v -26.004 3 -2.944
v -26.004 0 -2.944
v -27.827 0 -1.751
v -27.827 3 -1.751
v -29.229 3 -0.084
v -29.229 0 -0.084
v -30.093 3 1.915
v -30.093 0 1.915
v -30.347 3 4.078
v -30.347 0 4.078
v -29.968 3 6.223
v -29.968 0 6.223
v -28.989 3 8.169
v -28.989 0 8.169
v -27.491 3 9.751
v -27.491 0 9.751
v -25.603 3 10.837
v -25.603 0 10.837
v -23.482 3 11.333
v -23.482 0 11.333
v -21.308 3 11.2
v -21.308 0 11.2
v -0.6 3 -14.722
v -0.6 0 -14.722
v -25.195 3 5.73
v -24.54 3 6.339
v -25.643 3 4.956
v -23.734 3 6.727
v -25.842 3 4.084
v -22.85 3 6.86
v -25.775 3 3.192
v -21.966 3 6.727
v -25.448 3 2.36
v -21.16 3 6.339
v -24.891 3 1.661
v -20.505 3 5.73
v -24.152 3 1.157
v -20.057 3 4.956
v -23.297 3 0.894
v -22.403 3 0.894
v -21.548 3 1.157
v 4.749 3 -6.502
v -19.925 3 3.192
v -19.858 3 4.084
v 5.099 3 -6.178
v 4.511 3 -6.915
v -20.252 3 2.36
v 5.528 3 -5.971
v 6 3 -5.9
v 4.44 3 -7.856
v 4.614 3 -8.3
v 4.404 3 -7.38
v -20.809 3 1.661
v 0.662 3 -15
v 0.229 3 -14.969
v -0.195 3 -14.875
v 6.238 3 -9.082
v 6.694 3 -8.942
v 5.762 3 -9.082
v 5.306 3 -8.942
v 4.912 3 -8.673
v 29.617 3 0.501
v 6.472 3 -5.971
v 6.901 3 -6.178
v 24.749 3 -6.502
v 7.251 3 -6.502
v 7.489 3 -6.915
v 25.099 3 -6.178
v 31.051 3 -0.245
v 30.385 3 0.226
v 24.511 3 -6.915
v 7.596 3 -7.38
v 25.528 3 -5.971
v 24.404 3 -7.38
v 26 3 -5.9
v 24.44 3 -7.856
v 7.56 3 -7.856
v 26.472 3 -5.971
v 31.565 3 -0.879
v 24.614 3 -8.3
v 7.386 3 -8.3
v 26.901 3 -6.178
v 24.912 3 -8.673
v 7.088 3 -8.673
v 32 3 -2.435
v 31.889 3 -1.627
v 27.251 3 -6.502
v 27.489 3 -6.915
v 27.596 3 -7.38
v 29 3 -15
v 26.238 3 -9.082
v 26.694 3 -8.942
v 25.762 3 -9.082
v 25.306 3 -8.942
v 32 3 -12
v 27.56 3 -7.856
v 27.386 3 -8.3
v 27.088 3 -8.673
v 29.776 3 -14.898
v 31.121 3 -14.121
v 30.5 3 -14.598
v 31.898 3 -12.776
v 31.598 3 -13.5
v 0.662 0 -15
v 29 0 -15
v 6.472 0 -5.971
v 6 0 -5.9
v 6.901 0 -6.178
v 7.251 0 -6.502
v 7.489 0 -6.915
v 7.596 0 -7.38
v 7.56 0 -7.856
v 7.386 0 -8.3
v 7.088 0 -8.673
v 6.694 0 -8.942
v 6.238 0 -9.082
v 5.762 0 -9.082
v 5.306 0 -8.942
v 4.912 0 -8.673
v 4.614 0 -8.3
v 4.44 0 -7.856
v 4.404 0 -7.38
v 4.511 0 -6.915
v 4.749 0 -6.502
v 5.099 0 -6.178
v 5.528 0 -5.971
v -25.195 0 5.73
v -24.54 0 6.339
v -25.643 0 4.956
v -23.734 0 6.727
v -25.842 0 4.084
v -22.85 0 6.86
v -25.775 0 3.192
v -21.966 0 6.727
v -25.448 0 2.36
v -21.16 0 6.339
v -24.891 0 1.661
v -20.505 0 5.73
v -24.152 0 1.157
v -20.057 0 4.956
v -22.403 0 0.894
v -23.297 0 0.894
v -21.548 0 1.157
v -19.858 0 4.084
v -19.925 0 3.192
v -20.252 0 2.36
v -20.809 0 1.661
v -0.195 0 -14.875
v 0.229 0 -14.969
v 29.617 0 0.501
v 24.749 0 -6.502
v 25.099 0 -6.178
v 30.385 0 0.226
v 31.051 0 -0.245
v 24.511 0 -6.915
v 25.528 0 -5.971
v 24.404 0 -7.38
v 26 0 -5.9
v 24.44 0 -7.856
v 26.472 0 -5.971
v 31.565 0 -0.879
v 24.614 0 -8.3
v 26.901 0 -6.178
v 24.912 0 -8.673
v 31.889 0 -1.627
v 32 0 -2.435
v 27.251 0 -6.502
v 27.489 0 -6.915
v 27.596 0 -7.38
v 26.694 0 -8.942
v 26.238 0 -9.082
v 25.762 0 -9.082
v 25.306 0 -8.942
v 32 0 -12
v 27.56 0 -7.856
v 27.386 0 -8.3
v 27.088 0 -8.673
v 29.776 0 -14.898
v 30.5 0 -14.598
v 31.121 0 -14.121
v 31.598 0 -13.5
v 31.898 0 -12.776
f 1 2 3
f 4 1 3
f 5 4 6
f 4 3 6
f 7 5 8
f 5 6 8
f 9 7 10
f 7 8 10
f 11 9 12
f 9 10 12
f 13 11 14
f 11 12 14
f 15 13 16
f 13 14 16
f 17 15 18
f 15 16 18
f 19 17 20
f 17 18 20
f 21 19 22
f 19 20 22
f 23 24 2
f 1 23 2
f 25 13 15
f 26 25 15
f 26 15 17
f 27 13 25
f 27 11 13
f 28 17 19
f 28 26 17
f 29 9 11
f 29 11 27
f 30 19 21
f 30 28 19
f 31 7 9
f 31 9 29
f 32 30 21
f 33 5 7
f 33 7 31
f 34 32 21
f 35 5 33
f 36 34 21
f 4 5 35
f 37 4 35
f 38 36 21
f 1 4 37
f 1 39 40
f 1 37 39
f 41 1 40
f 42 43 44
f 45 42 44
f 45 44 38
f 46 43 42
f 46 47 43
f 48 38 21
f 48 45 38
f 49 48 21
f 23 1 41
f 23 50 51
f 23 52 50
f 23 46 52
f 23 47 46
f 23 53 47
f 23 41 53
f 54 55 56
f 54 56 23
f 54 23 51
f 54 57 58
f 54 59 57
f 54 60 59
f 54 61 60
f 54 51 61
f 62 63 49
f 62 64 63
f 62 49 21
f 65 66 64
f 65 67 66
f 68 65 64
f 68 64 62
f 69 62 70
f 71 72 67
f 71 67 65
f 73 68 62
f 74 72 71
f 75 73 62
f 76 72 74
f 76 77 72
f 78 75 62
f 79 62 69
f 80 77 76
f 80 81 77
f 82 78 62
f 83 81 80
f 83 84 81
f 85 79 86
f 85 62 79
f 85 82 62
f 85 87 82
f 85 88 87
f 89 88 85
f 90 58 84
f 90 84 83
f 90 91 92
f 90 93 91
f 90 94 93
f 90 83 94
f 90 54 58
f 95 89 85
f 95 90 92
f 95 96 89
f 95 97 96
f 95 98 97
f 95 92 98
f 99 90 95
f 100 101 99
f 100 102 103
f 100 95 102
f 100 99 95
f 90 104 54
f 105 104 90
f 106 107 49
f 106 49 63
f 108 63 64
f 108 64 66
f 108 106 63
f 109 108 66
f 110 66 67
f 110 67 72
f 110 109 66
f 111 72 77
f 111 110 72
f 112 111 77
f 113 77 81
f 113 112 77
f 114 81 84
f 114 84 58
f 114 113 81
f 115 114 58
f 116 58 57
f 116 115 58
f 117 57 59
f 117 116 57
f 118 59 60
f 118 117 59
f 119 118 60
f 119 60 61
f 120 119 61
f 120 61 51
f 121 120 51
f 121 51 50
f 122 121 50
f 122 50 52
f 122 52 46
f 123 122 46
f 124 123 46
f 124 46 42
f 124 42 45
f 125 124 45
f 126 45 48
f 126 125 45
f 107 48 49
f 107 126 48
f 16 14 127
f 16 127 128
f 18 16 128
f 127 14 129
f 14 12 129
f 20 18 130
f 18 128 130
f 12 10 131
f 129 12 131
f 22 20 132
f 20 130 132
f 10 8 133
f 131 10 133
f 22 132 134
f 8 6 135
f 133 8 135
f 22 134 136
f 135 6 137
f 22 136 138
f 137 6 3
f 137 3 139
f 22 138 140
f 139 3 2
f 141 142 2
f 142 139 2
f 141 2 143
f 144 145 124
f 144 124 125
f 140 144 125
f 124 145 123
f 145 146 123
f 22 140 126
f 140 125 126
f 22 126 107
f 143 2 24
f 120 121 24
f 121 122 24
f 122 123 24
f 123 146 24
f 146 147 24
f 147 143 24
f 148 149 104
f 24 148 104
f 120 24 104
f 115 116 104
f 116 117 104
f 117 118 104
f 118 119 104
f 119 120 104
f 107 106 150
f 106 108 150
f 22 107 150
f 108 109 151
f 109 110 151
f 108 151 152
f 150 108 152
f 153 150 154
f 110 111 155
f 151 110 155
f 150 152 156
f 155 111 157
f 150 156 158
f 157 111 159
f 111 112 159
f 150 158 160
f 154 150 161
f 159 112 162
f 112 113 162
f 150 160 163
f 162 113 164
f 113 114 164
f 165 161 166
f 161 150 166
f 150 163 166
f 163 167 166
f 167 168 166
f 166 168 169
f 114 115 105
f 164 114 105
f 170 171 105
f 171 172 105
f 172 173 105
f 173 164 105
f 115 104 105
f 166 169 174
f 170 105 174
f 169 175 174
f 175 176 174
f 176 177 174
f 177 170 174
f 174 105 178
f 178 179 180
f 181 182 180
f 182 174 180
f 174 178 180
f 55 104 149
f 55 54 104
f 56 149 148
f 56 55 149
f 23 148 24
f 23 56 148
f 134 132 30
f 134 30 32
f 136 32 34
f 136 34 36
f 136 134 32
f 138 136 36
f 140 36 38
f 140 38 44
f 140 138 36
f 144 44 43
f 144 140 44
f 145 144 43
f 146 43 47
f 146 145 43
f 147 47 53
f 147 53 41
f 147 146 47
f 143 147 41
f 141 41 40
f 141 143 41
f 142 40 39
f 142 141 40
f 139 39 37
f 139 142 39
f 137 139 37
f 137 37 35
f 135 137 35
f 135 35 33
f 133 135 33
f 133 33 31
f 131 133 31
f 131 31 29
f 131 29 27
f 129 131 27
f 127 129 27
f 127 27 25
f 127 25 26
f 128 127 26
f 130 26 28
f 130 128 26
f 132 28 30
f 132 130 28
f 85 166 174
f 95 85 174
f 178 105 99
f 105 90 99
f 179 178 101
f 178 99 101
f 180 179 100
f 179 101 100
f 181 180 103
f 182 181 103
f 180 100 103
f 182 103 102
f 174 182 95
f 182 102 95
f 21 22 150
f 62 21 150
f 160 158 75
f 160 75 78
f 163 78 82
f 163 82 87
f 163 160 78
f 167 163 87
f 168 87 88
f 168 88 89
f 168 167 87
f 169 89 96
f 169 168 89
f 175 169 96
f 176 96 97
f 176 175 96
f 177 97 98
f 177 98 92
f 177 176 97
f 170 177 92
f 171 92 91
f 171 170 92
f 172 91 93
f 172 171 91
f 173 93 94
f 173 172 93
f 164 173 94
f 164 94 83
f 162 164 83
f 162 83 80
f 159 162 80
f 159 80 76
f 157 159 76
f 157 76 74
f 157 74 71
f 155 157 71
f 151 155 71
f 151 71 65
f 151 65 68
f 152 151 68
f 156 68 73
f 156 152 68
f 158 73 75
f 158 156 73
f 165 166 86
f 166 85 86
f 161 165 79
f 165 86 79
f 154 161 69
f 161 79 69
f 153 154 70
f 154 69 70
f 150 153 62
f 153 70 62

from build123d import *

# Parameters (mm, degrees)
SKETCH_1_R      = 7.5
SKETCH_1_R_2    = 3
SKETCH_1_W      = 32
SKETCH_1_H      = 15
SKETCH_1_R_3    = 1.6
EXTRUDE_1_DEPTH = 3
FILLET_1_R      = 3


with BuildPart() as part:
    # 草图1 → 凸台-拉伸1 (new body)
    # profile 1 of 3: a face of its own
    with BuildSketch(Plane(origin=(0, 0, 0), x_dir=(1, 0, 0), z_dir=(0, 1, 0))):
        with Locations((-22.85, -3.86)):
            Circle(SKETCH_1_R)
        with Locations(Location((-22.85, -3.86, 0), (0, 0, 270))):
            Circle(SKETCH_1_R_2, mode=Mode.SUBTRACT)
    # profile 2 of 3: a face of its own
    with BuildSketch(Plane(origin=(0, 0, 0), x_dir=(1, 0, 0), z_dir=(0, 1, 0))):
        with BuildLine():
            Line((0, 0), (0, 15))
            Line((0, 15), (-26.004488854, 2.944351554))
            ThreePointArc((-26.004488854, 2.944351554), (-18.813210831, 2.460944012), (-15.35, -3.86))
            ThreePointArc((-15.35, -3.86), (-17.02696903, -8.586765312), (-21.307949418, -11.199760214))
            Line((-21.307949418, -11.199760214), (32, 0))
            Line((32, 0), (0, 0))
        make_face()
    # profile 3 of 3: a face of its own
    with BuildSketch(Plane(origin=(0, 0, 0), x_dir=(1, 0, 0), z_dir=(0, 1, 0))):
        with Locations((16, 7.5)):
            Rectangle(SKETCH_1_W, SKETCH_1_H)
        with Locations(Location((26, 7.5, 0), (0, 0, 270))):
            Circle(SKETCH_1_R_3, mode=Mode.SUBTRACT)
        with Locations(Location((6, 7.5, 0), (0, 0, 270))):
            Circle(SKETCH_1_R_3, mode=Mode.SUBTRACT)
    extrude(amount=EXTRUDE_1_DEPTH)

    # 圆角1
    fillet_1_edges = [part.edges().sort_by_distance(p)[0] for p in [
        (0, 1.5, -15),
        (32, 1.5, -15),
        (32, 1.5, 0),
    ]]
    fillet(fillet_1_edges, radius=FILLET_1_R)


solid = part.part
